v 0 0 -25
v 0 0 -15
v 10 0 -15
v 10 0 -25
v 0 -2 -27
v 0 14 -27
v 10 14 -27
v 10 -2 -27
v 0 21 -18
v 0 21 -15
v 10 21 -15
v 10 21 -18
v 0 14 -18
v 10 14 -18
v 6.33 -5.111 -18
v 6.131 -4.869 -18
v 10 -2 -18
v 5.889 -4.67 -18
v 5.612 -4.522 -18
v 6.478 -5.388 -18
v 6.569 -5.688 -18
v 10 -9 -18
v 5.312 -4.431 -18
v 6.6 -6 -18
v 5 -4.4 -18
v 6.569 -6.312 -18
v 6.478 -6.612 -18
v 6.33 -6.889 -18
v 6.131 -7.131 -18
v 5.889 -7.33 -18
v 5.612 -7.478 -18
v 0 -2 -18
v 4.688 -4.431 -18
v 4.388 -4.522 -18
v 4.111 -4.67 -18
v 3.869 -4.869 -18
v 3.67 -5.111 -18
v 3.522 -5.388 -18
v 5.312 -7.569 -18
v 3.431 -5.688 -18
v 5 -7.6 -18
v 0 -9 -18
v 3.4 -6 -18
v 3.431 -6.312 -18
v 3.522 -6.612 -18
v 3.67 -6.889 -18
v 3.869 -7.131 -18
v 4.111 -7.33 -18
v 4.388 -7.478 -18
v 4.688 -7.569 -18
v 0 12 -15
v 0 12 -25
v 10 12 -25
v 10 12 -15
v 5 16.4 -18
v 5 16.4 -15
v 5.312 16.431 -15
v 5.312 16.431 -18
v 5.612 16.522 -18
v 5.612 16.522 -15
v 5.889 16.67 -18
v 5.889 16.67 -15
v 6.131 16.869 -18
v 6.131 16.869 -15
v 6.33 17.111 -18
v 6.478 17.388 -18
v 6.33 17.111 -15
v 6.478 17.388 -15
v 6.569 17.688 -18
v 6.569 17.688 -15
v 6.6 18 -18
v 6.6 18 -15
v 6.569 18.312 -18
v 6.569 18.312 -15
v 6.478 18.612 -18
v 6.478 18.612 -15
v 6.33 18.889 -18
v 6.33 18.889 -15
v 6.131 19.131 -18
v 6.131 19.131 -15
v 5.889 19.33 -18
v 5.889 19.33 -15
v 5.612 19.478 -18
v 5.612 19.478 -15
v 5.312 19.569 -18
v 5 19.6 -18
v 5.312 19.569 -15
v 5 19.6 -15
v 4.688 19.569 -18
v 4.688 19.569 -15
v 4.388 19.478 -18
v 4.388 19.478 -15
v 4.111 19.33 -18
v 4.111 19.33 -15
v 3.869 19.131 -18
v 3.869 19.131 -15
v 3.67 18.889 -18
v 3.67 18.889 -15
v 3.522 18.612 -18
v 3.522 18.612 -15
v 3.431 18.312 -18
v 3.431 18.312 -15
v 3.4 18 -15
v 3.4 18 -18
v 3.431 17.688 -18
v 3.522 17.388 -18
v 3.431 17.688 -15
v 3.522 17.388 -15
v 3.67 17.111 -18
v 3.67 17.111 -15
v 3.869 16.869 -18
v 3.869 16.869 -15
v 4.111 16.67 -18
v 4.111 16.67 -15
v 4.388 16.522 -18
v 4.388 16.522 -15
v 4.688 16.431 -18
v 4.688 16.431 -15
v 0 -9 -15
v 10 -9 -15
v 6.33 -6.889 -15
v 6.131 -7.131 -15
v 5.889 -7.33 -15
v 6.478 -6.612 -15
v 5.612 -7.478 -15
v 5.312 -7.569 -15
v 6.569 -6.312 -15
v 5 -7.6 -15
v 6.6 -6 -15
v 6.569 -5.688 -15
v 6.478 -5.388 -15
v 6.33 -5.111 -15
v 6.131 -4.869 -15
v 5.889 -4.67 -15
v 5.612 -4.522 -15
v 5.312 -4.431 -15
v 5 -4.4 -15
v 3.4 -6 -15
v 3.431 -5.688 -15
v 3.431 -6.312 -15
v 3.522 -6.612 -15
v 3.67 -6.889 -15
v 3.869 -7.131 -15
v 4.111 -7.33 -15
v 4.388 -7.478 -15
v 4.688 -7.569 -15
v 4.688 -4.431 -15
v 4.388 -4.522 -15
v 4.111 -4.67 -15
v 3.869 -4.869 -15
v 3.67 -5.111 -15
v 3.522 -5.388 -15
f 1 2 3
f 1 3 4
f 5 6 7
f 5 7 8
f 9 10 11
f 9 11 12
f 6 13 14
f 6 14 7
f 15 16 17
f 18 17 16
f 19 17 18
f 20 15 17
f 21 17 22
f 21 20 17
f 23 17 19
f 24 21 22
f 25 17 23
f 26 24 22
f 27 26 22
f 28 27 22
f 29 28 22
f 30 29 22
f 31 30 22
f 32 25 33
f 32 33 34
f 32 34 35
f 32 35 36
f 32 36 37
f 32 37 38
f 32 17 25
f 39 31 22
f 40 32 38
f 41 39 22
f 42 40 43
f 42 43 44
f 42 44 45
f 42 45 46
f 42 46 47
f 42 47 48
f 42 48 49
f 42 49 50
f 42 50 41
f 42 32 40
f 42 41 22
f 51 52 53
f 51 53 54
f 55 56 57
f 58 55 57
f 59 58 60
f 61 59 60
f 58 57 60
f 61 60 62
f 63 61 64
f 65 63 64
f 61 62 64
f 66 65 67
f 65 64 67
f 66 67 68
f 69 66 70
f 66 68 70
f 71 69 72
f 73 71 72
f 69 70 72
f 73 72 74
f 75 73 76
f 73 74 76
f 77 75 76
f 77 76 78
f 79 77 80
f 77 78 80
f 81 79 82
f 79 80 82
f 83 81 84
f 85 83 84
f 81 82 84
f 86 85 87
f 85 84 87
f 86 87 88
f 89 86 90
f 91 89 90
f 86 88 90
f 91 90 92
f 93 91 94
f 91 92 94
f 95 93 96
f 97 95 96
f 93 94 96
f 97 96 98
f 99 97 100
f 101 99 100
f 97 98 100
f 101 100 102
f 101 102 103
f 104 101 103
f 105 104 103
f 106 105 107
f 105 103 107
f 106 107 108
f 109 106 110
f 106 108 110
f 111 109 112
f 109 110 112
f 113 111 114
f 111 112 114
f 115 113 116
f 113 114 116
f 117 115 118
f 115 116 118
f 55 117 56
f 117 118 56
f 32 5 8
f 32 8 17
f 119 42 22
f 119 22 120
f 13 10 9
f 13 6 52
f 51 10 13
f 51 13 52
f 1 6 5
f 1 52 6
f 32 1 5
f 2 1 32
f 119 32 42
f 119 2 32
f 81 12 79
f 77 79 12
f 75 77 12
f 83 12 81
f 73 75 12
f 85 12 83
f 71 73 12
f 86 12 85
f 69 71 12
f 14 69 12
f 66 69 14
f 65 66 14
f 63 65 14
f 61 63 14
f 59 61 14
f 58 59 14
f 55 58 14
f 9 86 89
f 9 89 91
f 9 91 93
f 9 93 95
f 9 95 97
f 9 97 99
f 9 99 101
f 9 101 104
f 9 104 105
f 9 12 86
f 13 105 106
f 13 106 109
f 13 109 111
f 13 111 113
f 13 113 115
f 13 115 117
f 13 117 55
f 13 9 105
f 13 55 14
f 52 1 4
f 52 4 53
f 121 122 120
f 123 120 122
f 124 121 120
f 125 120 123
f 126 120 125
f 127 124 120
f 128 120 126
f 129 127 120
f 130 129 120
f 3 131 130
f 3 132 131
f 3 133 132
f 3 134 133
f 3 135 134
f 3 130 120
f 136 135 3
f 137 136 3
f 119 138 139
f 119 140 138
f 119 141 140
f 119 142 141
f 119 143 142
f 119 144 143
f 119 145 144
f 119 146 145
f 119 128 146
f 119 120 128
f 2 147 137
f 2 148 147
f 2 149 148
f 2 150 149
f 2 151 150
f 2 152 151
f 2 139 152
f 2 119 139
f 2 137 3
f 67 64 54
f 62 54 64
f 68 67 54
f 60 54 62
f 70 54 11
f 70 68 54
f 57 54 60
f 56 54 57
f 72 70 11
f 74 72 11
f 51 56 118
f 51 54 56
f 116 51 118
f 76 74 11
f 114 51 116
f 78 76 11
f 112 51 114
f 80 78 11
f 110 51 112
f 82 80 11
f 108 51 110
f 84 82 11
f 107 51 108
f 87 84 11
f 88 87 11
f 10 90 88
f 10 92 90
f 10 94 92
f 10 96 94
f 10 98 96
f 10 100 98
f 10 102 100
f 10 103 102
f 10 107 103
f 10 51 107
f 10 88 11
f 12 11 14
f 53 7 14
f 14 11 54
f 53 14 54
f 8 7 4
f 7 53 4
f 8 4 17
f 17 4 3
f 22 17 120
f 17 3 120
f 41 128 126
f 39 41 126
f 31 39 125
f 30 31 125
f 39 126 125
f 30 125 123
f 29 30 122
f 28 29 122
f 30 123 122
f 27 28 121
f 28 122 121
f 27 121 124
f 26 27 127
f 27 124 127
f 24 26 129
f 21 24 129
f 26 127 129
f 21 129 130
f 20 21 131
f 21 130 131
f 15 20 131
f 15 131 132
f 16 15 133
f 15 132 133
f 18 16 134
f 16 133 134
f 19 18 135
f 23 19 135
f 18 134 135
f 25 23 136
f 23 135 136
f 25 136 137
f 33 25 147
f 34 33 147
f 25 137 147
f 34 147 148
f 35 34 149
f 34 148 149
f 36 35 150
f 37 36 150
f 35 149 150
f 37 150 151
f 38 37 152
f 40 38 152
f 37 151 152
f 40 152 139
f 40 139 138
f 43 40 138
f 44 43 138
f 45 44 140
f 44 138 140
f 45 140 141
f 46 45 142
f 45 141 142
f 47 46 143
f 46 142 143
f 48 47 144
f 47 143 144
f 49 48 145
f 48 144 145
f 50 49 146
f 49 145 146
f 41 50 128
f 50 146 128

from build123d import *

# Parameters (mm, degrees)
PAD_DEPTH    = 10
SKETCH001_R  = 1.6
POCKET_DEPTH = 3


with BuildPart() as part:
    # Sketch → Pad (new body)
    with BuildSketch(Plane.YZ):
        Polygon((-9, -15), (0, -15), (0, -25), (12, -25), (12, -15), (21, -15), (21, -18), (14, -18), (14, -27), (-2, -27), (-2, -18), (-9, -18), align=None)
    extrude(amount=PAD_DEPTH)

    # Sketch001 (on Face1 of Pad) → Pocket (cut)
    with BuildSketch(Plane(origin=(0, 0, -15), x_dir=(0, -1, 0), z_dir=(0, 0, 1))):
        with Locations((6, 5)):
            Circle(SKETCH001_R)
        with Locations((-18, 5)):
            Circle(SKETCH001_R)
    extrude(amount=-POCKET_DEPTH, mode=Mode.SUBTRACT)


solid = part.part
